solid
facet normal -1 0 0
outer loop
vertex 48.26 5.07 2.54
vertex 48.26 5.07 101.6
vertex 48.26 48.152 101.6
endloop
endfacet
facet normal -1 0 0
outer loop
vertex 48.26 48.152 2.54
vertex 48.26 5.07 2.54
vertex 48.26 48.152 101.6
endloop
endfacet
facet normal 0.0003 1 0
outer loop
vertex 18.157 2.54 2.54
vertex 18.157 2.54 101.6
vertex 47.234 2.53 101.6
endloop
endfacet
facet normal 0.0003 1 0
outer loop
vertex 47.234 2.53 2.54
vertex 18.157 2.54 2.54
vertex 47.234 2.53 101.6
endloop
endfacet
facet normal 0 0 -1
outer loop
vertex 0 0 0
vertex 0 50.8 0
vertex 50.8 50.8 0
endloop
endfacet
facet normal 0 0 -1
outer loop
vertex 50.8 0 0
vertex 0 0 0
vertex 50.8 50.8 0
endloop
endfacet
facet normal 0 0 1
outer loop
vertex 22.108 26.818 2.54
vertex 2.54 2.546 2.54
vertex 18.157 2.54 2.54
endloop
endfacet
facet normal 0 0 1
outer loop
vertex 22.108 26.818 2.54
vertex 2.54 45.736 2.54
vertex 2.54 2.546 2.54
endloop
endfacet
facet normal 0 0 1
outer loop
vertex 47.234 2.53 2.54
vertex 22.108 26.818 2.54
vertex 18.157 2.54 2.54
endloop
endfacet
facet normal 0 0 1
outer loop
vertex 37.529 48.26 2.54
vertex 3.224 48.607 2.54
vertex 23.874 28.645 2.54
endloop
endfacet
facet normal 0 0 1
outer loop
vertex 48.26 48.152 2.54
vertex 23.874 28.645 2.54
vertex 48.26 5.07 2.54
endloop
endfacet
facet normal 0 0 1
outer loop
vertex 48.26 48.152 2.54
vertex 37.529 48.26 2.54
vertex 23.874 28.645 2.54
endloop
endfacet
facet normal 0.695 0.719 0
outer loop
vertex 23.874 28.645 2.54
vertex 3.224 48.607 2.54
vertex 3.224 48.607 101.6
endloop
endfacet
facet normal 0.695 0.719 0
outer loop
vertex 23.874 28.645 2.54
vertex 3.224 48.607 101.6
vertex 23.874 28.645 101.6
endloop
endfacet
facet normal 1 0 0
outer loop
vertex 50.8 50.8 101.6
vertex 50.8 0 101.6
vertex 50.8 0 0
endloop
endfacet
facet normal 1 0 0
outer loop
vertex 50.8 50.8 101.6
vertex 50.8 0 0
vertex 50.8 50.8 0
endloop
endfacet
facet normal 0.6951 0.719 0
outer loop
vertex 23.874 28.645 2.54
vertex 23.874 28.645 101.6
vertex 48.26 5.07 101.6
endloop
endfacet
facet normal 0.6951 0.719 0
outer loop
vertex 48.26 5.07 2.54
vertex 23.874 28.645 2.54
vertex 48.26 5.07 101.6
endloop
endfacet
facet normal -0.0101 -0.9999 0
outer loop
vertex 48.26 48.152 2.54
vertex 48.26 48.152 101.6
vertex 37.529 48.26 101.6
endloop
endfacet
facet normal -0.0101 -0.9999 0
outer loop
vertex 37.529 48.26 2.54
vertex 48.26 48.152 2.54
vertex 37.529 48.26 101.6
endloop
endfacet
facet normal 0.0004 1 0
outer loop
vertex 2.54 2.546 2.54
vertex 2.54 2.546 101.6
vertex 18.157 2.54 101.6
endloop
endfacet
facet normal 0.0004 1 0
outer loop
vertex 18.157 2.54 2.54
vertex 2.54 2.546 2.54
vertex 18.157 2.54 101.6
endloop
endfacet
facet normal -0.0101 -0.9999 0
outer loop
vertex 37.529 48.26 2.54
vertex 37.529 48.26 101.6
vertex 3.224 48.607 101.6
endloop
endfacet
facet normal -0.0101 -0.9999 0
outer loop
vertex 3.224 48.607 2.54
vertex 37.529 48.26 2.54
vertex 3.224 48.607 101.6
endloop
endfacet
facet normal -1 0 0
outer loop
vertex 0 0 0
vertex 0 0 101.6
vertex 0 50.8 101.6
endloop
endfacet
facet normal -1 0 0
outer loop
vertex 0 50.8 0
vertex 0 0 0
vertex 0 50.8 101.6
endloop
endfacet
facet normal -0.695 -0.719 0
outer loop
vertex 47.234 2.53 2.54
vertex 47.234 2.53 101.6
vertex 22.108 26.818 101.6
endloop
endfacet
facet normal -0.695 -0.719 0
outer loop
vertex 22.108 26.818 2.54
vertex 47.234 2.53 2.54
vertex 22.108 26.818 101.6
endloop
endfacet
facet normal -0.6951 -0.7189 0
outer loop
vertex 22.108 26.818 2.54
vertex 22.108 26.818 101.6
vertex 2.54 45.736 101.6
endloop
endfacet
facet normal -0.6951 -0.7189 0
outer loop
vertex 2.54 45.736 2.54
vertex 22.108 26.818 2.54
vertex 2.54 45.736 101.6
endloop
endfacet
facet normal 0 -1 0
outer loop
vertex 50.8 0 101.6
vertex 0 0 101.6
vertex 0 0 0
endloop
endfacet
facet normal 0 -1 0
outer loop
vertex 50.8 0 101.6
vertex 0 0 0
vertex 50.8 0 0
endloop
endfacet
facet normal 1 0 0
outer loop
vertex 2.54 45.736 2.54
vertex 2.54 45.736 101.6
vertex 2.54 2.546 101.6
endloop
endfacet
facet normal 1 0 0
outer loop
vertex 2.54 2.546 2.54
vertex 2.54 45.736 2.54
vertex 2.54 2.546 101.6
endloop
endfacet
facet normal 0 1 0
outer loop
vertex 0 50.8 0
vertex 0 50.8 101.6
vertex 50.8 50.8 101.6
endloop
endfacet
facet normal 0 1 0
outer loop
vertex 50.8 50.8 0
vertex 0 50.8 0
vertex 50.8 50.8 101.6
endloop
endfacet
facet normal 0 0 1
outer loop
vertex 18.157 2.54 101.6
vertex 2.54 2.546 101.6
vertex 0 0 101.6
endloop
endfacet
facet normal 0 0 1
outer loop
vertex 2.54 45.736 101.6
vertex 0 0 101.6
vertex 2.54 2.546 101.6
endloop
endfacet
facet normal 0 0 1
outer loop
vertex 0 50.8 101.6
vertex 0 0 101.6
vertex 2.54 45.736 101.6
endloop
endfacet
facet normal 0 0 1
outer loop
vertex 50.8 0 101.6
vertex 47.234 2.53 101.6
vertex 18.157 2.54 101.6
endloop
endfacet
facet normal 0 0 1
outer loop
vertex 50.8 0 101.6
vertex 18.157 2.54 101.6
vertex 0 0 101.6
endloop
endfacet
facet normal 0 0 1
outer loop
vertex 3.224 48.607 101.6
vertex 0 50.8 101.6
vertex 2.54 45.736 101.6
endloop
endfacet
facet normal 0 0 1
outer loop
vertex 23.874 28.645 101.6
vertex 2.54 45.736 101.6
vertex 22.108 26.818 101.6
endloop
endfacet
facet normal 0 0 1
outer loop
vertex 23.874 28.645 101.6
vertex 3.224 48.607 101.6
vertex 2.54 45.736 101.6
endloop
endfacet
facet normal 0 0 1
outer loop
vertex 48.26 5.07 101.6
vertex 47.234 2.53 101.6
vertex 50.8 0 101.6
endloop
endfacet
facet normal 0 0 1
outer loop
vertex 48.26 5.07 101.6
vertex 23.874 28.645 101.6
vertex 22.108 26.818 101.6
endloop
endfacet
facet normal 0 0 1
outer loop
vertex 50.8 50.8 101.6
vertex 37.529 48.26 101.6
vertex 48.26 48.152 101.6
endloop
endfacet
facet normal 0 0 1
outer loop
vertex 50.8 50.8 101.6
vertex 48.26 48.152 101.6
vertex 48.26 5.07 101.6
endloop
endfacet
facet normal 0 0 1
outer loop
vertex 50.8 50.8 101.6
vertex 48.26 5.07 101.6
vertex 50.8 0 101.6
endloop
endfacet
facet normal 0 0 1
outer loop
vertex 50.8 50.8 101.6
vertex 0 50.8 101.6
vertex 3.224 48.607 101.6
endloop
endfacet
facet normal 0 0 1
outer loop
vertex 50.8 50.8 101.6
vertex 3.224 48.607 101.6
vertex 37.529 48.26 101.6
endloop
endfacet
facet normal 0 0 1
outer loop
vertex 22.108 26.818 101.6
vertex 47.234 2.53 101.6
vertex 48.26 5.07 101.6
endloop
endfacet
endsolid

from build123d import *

# Parameters (mm, degrees)
F0_W     = 50.8
F0_H     = 50.8
F1_DEPTH = 101.6
F3_DEPTH = 99.06
F4_DEPTH = 99.06


with BuildPart() as f1:
    # F0 (on Top) → F1 (new body)
    with BuildSketch(Plane.XY):
        with Locations((25.4, 25.4)):
            Rectangle(F0_W, F0_H)
    extrude(amount=F1_DEPTH)

    # F2 (on face) → F3 (cut)
    with BuildSketch(Plane.XY.offset(101.6)):
        Polygon((2.54, 7.489045), (2.54, 2.545525), (18.157401, 2.54), (47.233673, 2.529714), (22.108479, 26.818483), (2.54, 45.735521), align=None)
    extrude(amount=-F3_DEPTH, mode=Mode.SUBTRACT)

    # F2 (on face) → F4 (cut)
    with BuildSketch(Plane.XY.offset(101.6)):
        Polygon((3.224171, 48.606943), (23.873876, 28.644674), (48.26, 5.070372), (48.26, 33.179211), (48.26, 48.151647), (37.52937, 48.26013), align=None)
    extrude(amount=-F4_DEPTH, mode=Mode.SUBTRACT)


solid = f1.part
